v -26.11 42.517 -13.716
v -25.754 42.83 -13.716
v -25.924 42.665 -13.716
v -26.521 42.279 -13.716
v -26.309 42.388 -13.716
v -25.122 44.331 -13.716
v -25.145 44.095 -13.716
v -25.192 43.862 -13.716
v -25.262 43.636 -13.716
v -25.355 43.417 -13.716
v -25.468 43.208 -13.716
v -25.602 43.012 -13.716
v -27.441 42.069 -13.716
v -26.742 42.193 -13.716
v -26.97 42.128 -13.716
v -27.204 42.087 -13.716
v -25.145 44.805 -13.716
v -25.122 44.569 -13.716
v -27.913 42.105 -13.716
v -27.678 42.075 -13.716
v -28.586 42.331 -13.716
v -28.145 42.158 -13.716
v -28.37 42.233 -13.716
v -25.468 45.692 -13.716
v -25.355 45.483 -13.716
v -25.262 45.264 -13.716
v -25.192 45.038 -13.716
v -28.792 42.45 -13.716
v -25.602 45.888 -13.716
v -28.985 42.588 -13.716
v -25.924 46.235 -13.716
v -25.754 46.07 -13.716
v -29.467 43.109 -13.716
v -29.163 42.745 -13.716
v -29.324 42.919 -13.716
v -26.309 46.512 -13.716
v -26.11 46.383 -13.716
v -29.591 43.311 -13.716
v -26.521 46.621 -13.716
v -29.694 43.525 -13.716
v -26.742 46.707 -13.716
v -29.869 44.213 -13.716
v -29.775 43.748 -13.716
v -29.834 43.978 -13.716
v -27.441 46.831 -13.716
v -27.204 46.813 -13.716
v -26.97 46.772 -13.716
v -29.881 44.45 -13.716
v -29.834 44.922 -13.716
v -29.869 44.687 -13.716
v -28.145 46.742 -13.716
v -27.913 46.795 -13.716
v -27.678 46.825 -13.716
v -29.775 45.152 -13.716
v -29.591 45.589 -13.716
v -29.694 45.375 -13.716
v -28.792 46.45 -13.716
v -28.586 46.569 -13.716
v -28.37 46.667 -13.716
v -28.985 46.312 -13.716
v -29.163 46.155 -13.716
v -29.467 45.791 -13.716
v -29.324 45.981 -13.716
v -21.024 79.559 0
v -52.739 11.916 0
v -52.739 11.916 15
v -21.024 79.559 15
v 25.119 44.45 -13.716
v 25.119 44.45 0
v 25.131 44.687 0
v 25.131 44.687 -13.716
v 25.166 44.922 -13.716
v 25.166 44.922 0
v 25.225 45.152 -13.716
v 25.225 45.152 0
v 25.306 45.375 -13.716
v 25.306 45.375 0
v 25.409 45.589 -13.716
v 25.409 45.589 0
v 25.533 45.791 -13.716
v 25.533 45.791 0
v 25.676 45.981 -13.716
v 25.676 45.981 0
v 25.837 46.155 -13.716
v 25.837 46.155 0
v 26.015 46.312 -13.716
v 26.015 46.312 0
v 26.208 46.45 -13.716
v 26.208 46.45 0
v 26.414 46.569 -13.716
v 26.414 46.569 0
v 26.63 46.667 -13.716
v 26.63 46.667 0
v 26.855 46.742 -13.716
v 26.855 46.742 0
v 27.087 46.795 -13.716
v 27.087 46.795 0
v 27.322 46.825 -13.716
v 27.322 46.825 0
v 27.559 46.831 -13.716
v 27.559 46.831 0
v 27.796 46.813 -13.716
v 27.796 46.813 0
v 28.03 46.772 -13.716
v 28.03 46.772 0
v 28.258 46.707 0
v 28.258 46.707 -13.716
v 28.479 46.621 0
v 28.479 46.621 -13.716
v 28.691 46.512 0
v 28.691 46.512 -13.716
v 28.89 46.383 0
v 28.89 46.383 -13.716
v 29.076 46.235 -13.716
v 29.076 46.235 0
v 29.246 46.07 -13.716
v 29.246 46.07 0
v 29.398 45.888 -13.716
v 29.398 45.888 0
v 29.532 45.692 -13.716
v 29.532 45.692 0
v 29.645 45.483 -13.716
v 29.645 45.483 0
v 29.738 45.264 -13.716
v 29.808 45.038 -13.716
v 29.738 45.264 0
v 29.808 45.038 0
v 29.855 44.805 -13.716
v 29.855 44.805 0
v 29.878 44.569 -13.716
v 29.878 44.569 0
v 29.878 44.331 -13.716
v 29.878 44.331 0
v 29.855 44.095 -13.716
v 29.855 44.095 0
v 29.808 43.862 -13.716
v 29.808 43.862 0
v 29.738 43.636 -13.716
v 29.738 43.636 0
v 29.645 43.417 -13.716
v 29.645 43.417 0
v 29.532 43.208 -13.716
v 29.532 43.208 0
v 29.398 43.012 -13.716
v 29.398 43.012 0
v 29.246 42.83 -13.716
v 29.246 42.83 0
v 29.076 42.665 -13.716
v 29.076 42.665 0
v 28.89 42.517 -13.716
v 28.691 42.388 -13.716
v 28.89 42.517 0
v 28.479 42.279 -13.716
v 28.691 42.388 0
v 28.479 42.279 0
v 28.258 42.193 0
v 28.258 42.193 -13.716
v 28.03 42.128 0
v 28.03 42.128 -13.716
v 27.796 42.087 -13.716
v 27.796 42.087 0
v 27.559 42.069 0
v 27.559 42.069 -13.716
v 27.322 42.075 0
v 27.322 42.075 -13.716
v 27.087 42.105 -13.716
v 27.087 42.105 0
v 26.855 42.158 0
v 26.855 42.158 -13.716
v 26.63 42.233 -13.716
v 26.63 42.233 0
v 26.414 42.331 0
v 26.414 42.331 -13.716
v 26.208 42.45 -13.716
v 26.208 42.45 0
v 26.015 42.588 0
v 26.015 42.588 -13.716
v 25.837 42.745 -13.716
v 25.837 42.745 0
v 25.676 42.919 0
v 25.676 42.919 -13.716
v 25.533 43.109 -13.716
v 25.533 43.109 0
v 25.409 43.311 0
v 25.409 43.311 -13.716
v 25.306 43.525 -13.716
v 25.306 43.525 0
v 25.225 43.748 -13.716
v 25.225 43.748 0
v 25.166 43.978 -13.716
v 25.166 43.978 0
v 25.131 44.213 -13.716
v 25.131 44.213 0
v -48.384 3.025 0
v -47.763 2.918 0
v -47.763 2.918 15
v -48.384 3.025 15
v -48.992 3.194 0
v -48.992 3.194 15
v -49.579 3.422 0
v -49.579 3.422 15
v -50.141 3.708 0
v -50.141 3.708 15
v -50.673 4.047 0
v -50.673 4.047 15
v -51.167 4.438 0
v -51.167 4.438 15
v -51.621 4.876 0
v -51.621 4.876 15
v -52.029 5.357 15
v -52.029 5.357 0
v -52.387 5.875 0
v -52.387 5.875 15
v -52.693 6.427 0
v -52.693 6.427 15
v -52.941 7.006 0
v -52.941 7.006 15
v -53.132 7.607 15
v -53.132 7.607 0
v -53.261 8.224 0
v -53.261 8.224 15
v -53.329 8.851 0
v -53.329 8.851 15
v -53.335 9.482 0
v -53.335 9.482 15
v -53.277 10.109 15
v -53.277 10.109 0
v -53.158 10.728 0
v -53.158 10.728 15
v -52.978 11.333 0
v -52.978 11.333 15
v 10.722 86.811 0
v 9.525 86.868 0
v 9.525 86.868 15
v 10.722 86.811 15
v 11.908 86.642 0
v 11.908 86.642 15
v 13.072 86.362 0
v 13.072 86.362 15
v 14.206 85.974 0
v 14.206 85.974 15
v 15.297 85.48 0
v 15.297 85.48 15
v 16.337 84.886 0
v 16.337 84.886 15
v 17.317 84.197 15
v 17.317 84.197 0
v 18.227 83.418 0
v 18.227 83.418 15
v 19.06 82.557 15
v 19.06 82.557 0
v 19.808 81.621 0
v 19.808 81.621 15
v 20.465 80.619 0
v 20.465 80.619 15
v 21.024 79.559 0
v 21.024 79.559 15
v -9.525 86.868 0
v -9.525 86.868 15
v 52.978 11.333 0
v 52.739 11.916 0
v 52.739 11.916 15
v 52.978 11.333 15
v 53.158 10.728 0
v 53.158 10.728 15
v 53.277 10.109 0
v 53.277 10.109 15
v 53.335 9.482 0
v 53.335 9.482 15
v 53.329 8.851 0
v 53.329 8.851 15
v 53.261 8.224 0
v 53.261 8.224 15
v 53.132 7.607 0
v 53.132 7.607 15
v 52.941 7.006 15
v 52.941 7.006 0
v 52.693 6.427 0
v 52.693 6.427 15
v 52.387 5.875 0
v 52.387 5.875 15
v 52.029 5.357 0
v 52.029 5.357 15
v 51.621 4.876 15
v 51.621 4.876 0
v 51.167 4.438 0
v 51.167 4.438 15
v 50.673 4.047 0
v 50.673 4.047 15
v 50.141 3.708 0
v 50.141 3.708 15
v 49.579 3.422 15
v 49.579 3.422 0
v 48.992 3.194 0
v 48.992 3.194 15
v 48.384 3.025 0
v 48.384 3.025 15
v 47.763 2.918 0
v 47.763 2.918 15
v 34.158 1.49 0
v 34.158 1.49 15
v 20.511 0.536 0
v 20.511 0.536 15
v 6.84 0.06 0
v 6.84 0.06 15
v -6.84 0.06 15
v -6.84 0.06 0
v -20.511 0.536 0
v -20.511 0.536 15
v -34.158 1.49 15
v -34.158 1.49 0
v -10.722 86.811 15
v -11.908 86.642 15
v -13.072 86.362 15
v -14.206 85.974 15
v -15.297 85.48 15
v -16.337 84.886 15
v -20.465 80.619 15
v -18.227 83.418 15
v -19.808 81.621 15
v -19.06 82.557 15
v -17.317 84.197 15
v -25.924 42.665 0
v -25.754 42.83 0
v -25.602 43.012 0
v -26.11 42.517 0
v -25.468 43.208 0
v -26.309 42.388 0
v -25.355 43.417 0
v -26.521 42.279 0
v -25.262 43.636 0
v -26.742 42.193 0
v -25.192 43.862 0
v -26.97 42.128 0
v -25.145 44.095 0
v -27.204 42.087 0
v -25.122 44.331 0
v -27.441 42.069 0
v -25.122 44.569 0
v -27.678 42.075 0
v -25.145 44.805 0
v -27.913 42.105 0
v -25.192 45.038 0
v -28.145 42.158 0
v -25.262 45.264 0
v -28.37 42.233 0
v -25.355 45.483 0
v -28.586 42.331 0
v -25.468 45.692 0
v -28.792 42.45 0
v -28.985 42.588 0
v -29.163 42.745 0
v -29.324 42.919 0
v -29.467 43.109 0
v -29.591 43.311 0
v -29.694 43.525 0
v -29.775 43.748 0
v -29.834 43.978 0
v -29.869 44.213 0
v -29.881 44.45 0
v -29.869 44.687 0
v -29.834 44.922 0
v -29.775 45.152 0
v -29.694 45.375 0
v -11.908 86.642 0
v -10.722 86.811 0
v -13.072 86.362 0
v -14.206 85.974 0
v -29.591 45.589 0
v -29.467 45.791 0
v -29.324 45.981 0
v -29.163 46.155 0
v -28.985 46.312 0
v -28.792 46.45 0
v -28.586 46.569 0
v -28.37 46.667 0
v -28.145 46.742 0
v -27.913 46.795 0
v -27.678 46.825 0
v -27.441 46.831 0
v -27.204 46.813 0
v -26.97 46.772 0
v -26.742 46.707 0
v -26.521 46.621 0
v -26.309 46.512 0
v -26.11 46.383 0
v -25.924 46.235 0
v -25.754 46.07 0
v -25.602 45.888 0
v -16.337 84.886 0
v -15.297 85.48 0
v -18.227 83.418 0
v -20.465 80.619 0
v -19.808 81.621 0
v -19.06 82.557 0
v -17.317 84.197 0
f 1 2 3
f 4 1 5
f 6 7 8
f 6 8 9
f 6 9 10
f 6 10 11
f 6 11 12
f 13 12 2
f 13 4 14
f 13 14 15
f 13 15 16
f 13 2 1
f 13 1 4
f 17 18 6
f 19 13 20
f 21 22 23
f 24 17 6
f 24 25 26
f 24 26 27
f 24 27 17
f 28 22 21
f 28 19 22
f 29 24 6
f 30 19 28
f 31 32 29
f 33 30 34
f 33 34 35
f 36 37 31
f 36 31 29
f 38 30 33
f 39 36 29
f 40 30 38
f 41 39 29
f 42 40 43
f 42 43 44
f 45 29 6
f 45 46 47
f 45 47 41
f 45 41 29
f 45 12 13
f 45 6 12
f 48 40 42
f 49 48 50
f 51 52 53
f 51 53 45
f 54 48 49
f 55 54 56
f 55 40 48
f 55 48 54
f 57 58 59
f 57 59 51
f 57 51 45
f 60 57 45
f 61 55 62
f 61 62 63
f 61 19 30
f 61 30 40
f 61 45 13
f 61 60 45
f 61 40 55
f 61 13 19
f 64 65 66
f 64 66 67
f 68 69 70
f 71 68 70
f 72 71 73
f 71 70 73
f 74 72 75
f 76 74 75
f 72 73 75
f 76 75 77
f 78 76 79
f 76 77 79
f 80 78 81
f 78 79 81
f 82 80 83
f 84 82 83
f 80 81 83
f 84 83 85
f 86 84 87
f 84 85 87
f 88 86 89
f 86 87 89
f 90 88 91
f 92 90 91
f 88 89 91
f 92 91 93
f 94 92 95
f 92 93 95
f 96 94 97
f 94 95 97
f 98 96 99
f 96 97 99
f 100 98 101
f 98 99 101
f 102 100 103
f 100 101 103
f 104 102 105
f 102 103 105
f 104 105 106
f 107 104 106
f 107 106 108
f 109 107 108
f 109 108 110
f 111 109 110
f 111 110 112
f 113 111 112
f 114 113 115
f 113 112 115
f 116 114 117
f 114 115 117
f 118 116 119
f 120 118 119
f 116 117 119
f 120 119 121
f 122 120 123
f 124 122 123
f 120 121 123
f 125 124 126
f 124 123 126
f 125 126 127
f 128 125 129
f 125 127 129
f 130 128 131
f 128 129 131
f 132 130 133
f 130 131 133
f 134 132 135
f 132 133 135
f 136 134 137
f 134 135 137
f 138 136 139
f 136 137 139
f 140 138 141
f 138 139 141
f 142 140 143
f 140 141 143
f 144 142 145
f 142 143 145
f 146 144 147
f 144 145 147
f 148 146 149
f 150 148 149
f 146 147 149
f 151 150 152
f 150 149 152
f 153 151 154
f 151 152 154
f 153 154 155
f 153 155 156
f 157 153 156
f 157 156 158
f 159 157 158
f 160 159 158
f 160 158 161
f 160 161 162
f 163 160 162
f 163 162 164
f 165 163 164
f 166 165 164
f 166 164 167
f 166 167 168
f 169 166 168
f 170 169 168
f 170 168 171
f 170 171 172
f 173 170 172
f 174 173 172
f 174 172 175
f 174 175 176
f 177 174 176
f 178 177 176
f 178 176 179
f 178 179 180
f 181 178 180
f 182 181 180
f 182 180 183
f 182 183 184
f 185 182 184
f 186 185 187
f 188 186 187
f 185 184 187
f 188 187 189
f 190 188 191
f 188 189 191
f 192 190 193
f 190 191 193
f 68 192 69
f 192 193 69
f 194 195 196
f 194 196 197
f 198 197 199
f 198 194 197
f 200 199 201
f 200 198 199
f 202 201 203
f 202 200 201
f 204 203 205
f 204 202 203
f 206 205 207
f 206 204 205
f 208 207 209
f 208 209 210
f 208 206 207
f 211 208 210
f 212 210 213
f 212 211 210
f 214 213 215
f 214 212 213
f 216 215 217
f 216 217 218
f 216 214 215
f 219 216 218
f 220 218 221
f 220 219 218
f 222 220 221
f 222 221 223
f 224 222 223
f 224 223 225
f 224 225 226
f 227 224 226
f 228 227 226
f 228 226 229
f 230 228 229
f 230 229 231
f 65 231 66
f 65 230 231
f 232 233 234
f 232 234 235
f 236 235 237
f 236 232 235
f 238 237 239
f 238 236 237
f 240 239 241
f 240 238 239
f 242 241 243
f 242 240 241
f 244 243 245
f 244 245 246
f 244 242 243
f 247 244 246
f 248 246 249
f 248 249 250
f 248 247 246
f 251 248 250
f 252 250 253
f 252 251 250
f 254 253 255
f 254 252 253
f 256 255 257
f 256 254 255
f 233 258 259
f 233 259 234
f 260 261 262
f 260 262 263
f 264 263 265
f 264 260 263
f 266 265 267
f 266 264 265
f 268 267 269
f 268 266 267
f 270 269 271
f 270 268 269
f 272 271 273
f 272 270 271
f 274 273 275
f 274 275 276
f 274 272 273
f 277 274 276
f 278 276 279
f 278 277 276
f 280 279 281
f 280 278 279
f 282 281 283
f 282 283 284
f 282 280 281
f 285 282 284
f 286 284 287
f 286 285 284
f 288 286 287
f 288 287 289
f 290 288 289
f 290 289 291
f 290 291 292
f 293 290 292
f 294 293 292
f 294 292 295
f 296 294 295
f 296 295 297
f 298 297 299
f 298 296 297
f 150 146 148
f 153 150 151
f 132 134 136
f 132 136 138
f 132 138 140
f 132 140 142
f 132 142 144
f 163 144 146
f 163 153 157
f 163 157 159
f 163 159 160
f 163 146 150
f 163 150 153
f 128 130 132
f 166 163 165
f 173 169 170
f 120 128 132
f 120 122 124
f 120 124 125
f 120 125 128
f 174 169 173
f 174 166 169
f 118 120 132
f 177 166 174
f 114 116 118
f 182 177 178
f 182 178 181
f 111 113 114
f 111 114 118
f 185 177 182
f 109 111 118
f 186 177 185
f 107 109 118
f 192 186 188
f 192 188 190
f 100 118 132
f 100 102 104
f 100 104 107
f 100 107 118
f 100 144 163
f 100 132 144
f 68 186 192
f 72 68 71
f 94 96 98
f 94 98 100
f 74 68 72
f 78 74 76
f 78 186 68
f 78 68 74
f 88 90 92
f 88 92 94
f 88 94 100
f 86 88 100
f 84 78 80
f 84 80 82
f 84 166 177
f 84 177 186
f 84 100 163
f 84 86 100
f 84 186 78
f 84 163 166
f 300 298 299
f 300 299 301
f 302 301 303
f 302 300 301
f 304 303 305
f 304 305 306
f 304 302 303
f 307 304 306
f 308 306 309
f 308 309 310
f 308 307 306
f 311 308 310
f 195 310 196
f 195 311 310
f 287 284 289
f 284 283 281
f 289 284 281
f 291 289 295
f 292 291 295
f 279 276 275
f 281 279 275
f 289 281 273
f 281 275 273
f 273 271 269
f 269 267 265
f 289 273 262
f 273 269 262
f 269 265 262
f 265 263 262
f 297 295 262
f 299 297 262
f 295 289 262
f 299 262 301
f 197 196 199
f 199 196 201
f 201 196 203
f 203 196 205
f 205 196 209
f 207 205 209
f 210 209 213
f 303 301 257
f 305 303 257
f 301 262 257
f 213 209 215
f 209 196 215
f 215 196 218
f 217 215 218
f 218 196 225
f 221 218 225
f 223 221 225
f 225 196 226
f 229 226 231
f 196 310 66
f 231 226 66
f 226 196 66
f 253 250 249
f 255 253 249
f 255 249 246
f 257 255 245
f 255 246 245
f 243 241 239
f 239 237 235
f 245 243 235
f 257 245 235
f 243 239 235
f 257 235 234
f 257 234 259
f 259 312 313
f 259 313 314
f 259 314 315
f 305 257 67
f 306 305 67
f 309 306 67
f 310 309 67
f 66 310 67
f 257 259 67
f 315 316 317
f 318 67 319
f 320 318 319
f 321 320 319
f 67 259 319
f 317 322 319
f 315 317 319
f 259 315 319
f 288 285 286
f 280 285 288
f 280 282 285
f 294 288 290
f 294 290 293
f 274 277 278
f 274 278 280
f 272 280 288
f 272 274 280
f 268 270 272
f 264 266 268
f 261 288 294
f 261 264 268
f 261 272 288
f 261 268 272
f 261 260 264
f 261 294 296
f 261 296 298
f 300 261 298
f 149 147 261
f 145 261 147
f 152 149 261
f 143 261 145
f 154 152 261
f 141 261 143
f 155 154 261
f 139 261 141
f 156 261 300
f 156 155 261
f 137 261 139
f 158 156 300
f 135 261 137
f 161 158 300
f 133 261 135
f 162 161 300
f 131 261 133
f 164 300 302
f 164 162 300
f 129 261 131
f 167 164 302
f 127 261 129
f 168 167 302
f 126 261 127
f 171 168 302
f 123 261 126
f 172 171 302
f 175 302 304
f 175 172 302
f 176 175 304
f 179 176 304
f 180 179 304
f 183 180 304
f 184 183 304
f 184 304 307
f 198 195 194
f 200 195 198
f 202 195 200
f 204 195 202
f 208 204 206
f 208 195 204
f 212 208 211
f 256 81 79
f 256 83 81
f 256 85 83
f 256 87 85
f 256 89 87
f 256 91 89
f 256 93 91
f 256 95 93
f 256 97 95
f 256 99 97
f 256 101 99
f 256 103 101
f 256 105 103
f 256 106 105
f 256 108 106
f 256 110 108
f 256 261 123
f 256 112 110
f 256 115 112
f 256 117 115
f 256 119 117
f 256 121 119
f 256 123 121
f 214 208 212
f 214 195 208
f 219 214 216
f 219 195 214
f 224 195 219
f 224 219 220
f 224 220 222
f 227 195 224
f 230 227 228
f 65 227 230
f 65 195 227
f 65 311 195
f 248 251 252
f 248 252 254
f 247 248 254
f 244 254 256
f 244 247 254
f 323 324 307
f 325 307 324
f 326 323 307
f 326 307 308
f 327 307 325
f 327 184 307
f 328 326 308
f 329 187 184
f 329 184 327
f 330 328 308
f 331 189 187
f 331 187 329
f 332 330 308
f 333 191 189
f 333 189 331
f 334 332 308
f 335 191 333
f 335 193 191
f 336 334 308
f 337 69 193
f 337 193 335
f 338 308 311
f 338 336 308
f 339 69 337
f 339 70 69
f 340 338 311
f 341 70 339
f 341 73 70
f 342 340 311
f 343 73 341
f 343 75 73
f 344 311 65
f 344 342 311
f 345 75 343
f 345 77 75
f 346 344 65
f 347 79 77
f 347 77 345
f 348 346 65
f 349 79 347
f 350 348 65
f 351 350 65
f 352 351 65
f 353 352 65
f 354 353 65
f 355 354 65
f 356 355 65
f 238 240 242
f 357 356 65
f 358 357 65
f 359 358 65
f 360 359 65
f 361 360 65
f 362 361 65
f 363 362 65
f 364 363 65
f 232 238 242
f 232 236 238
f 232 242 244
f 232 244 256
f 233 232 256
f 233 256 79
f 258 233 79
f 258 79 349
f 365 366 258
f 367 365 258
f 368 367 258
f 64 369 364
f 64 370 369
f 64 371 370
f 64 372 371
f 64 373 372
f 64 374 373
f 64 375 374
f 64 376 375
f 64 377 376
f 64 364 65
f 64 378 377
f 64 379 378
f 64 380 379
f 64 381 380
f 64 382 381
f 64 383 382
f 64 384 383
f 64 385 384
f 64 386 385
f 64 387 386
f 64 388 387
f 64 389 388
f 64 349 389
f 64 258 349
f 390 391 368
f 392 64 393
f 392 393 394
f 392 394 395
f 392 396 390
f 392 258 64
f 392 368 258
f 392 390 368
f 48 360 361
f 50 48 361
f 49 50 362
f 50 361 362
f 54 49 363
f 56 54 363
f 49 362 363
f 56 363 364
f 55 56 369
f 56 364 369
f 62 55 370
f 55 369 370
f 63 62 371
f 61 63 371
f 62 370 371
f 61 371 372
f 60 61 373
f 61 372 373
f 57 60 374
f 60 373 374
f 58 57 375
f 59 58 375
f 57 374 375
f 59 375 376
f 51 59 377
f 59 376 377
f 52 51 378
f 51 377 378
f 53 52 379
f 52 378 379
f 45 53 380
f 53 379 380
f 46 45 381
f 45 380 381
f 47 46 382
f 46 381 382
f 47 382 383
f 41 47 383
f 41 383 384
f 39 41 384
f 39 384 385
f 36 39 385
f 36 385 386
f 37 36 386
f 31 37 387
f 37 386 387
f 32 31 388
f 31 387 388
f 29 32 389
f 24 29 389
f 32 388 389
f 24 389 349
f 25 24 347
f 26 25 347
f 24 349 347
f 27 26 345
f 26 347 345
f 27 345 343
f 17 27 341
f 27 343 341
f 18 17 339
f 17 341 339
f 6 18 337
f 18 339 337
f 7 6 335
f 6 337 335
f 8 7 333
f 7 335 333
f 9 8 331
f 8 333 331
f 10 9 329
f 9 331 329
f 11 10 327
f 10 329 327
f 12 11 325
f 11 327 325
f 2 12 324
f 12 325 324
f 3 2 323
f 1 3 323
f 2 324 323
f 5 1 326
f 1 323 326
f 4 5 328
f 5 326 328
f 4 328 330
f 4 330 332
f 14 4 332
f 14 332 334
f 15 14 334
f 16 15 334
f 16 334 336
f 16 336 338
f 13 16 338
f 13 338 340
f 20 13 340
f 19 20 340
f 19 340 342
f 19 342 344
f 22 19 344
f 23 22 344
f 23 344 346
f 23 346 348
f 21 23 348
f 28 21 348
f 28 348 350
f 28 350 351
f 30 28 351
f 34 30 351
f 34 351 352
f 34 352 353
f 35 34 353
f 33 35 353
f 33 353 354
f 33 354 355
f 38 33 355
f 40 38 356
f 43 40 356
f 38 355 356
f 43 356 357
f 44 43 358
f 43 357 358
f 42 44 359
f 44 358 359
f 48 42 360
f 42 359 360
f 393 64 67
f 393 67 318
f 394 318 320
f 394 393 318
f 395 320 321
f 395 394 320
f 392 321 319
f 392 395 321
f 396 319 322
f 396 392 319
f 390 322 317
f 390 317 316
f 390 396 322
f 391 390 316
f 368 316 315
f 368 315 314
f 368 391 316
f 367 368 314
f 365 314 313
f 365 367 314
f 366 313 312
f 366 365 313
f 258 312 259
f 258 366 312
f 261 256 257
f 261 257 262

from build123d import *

# Parameters (mm, degrees)
BOSS_EXTRUDE1_DEPTH = 15
SKETCH2_R           = 2.38125
BOSS_EXTRUDE2_DEPTH = 13.716


with BuildPart() as part:
    # Sketch1 → Boss-Extrude1 (new body)
    with BuildSketch(Plane.XY):
        with BuildLine():
            Line((-52.739408914, 11.9161458), (-21.023817827, 79.5593995))
            ThreePointArc((-21.023817827, 79.5593995), (-16.337460141, 84.886226851), (-9.525, 86.868))
            Line((-9.525, 86.868), (9.525, 86.868))
            ThreePointArc((9.525, 86.868), (16.337460141, 84.886226851), (21.023817827, 79.5593995))
            Line((21.023817827, 79.5593995), (52.739408914, 11.9161458))
            ThreePointArc((52.739408914, 11.9161458), (52.54682937, 6.1473129), (47.762912079, 2.917660402))
            ThreePointArc((47.762912079, 2.917660402), (0, 0), (-47.762912079, 2.917660402))
            ThreePointArc((-47.762912079, 2.917660402), (-52.54682937, 6.1473129), (-52.739408914, 11.9161458))
        make_face()
    extrude(amount=BOSS_EXTRUDE1_DEPTH)

    # Sketch2 → Boss-Extrude2 (add)
    with BuildSketch(Plane(origin=(0, 0, 0), x_dir=(-1, 0, 0), z_dir=(0, 0, -1))):
        with Locations((-27.5, 44.45)):
            Circle(SKETCH2_R)
        with Locations((27.5, 44.45)):
            Circle(SKETCH2_R)
    extrude(amount=BOSS_EXTRUDE2_DEPTH)


solid = part.part
